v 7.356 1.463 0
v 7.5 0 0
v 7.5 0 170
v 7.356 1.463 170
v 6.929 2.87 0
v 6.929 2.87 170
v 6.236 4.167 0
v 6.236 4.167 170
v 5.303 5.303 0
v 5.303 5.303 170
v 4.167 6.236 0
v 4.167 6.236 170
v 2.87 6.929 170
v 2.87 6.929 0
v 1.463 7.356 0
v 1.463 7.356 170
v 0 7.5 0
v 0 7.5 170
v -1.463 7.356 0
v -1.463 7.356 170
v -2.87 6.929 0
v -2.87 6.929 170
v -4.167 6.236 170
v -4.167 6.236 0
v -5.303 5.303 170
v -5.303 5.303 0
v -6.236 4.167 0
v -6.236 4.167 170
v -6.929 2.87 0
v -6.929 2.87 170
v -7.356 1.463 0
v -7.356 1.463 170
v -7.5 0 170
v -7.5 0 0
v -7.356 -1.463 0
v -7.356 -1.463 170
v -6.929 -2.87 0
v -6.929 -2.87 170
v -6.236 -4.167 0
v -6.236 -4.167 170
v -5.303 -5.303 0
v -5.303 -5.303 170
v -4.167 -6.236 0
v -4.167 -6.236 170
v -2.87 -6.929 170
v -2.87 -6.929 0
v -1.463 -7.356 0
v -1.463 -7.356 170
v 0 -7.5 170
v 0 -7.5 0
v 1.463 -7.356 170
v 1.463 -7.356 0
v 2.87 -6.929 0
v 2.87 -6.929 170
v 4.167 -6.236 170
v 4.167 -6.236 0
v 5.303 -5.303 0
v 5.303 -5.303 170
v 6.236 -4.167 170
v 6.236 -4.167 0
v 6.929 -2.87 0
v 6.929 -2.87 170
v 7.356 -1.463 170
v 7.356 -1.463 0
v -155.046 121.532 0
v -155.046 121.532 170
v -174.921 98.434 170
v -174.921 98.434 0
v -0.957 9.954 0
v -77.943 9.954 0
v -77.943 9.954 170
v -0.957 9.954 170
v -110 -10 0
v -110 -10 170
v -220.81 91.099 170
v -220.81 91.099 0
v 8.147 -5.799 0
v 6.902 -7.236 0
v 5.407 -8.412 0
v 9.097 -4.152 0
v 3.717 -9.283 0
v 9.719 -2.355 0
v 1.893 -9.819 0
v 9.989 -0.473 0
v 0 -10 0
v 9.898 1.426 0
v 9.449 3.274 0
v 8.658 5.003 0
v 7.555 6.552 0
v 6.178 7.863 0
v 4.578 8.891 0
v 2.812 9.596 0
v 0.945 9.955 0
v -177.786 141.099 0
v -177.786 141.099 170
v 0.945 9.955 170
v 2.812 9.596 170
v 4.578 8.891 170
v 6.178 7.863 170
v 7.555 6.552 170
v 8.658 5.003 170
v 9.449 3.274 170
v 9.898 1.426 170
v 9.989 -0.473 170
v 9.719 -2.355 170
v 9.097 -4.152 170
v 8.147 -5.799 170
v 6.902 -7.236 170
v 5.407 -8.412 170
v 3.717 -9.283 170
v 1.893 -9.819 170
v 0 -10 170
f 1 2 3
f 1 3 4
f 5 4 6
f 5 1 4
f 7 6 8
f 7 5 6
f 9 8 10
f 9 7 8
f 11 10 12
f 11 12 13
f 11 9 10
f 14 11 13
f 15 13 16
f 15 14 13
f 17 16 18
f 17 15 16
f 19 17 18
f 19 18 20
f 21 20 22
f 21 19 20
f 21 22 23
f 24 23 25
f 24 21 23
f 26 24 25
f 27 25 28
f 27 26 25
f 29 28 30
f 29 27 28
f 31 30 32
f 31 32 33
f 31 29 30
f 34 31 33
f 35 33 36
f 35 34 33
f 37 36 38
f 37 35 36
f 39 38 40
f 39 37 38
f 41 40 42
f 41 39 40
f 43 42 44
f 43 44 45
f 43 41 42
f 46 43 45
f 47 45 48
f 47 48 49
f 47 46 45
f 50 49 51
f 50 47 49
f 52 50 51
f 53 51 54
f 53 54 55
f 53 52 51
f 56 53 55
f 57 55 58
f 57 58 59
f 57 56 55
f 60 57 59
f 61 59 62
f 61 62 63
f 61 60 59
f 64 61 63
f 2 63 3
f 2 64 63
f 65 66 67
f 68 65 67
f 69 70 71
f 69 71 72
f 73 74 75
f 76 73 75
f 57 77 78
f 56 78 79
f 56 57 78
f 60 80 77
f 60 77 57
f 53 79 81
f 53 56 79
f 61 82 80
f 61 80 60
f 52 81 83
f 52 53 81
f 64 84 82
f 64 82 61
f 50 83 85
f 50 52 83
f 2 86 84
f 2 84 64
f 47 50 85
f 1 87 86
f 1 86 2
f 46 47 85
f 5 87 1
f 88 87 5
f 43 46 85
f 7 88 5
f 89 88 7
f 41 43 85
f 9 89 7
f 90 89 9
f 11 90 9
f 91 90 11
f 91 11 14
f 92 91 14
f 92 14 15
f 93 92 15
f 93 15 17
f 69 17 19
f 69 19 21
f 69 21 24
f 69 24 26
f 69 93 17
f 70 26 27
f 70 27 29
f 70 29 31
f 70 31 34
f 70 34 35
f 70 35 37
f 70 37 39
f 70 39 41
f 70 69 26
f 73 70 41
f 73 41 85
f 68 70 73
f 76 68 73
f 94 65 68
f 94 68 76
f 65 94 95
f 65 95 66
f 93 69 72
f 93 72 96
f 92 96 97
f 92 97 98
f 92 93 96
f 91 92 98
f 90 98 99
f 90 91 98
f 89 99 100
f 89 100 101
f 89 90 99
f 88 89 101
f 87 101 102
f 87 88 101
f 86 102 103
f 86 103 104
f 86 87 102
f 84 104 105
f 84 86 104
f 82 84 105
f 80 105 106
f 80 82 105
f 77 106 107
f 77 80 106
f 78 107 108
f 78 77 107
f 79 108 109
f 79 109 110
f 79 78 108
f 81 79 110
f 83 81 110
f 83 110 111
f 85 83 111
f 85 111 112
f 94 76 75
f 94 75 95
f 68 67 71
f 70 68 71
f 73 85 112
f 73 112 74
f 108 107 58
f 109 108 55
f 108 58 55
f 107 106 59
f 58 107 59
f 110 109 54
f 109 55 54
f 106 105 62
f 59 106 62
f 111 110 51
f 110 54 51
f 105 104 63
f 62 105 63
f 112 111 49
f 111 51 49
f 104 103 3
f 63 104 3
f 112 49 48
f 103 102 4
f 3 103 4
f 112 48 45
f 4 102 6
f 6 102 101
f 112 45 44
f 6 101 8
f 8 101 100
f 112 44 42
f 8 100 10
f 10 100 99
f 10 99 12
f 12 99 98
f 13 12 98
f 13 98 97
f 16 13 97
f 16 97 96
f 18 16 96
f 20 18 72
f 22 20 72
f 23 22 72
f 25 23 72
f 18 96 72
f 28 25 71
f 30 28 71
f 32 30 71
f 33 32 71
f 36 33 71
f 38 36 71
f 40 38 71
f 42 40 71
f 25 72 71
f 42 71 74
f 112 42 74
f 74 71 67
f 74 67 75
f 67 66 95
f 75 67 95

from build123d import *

# Parameters (mm, degrees)
SKETCH_1_R      = 7.5
EXTRUDE_1_DEPTH = 170


with BuildPart() as part:
    # 草图1 → 凸台-拉伸1 (new body)
    with BuildSketch(Plane.XY):
        with BuildLine():
            Line((0, -10), (-110, -10))
            Line((-110, -10), (-220.810216861, 91.099435405))
            Line((-220.810216861, 91.099435405), (-177.785501138, 141.099435405))
            Line((-177.785501138, 141.099435405), (-155.045503197, 121.531796466))
            Line((-155.045503197, 121.531796466), (-174.921114521, 98.433896817))
            Line((-174.921114521, 98.433896817), (-77.942720008, 9.954140983))
            Line((-77.942720008, 9.954140983), (-0.956596724, 9.954140983))
            ThreePointArc((-0.956596724, 9.954140983), (9.988528666, 0.478847664), (0, -10))
        make_face()
        Circle(SKETCH_1_R, mode=Mode.SUBTRACT)
    extrude(amount=EXTRUDE_1_DEPTH)


solid = part.part
